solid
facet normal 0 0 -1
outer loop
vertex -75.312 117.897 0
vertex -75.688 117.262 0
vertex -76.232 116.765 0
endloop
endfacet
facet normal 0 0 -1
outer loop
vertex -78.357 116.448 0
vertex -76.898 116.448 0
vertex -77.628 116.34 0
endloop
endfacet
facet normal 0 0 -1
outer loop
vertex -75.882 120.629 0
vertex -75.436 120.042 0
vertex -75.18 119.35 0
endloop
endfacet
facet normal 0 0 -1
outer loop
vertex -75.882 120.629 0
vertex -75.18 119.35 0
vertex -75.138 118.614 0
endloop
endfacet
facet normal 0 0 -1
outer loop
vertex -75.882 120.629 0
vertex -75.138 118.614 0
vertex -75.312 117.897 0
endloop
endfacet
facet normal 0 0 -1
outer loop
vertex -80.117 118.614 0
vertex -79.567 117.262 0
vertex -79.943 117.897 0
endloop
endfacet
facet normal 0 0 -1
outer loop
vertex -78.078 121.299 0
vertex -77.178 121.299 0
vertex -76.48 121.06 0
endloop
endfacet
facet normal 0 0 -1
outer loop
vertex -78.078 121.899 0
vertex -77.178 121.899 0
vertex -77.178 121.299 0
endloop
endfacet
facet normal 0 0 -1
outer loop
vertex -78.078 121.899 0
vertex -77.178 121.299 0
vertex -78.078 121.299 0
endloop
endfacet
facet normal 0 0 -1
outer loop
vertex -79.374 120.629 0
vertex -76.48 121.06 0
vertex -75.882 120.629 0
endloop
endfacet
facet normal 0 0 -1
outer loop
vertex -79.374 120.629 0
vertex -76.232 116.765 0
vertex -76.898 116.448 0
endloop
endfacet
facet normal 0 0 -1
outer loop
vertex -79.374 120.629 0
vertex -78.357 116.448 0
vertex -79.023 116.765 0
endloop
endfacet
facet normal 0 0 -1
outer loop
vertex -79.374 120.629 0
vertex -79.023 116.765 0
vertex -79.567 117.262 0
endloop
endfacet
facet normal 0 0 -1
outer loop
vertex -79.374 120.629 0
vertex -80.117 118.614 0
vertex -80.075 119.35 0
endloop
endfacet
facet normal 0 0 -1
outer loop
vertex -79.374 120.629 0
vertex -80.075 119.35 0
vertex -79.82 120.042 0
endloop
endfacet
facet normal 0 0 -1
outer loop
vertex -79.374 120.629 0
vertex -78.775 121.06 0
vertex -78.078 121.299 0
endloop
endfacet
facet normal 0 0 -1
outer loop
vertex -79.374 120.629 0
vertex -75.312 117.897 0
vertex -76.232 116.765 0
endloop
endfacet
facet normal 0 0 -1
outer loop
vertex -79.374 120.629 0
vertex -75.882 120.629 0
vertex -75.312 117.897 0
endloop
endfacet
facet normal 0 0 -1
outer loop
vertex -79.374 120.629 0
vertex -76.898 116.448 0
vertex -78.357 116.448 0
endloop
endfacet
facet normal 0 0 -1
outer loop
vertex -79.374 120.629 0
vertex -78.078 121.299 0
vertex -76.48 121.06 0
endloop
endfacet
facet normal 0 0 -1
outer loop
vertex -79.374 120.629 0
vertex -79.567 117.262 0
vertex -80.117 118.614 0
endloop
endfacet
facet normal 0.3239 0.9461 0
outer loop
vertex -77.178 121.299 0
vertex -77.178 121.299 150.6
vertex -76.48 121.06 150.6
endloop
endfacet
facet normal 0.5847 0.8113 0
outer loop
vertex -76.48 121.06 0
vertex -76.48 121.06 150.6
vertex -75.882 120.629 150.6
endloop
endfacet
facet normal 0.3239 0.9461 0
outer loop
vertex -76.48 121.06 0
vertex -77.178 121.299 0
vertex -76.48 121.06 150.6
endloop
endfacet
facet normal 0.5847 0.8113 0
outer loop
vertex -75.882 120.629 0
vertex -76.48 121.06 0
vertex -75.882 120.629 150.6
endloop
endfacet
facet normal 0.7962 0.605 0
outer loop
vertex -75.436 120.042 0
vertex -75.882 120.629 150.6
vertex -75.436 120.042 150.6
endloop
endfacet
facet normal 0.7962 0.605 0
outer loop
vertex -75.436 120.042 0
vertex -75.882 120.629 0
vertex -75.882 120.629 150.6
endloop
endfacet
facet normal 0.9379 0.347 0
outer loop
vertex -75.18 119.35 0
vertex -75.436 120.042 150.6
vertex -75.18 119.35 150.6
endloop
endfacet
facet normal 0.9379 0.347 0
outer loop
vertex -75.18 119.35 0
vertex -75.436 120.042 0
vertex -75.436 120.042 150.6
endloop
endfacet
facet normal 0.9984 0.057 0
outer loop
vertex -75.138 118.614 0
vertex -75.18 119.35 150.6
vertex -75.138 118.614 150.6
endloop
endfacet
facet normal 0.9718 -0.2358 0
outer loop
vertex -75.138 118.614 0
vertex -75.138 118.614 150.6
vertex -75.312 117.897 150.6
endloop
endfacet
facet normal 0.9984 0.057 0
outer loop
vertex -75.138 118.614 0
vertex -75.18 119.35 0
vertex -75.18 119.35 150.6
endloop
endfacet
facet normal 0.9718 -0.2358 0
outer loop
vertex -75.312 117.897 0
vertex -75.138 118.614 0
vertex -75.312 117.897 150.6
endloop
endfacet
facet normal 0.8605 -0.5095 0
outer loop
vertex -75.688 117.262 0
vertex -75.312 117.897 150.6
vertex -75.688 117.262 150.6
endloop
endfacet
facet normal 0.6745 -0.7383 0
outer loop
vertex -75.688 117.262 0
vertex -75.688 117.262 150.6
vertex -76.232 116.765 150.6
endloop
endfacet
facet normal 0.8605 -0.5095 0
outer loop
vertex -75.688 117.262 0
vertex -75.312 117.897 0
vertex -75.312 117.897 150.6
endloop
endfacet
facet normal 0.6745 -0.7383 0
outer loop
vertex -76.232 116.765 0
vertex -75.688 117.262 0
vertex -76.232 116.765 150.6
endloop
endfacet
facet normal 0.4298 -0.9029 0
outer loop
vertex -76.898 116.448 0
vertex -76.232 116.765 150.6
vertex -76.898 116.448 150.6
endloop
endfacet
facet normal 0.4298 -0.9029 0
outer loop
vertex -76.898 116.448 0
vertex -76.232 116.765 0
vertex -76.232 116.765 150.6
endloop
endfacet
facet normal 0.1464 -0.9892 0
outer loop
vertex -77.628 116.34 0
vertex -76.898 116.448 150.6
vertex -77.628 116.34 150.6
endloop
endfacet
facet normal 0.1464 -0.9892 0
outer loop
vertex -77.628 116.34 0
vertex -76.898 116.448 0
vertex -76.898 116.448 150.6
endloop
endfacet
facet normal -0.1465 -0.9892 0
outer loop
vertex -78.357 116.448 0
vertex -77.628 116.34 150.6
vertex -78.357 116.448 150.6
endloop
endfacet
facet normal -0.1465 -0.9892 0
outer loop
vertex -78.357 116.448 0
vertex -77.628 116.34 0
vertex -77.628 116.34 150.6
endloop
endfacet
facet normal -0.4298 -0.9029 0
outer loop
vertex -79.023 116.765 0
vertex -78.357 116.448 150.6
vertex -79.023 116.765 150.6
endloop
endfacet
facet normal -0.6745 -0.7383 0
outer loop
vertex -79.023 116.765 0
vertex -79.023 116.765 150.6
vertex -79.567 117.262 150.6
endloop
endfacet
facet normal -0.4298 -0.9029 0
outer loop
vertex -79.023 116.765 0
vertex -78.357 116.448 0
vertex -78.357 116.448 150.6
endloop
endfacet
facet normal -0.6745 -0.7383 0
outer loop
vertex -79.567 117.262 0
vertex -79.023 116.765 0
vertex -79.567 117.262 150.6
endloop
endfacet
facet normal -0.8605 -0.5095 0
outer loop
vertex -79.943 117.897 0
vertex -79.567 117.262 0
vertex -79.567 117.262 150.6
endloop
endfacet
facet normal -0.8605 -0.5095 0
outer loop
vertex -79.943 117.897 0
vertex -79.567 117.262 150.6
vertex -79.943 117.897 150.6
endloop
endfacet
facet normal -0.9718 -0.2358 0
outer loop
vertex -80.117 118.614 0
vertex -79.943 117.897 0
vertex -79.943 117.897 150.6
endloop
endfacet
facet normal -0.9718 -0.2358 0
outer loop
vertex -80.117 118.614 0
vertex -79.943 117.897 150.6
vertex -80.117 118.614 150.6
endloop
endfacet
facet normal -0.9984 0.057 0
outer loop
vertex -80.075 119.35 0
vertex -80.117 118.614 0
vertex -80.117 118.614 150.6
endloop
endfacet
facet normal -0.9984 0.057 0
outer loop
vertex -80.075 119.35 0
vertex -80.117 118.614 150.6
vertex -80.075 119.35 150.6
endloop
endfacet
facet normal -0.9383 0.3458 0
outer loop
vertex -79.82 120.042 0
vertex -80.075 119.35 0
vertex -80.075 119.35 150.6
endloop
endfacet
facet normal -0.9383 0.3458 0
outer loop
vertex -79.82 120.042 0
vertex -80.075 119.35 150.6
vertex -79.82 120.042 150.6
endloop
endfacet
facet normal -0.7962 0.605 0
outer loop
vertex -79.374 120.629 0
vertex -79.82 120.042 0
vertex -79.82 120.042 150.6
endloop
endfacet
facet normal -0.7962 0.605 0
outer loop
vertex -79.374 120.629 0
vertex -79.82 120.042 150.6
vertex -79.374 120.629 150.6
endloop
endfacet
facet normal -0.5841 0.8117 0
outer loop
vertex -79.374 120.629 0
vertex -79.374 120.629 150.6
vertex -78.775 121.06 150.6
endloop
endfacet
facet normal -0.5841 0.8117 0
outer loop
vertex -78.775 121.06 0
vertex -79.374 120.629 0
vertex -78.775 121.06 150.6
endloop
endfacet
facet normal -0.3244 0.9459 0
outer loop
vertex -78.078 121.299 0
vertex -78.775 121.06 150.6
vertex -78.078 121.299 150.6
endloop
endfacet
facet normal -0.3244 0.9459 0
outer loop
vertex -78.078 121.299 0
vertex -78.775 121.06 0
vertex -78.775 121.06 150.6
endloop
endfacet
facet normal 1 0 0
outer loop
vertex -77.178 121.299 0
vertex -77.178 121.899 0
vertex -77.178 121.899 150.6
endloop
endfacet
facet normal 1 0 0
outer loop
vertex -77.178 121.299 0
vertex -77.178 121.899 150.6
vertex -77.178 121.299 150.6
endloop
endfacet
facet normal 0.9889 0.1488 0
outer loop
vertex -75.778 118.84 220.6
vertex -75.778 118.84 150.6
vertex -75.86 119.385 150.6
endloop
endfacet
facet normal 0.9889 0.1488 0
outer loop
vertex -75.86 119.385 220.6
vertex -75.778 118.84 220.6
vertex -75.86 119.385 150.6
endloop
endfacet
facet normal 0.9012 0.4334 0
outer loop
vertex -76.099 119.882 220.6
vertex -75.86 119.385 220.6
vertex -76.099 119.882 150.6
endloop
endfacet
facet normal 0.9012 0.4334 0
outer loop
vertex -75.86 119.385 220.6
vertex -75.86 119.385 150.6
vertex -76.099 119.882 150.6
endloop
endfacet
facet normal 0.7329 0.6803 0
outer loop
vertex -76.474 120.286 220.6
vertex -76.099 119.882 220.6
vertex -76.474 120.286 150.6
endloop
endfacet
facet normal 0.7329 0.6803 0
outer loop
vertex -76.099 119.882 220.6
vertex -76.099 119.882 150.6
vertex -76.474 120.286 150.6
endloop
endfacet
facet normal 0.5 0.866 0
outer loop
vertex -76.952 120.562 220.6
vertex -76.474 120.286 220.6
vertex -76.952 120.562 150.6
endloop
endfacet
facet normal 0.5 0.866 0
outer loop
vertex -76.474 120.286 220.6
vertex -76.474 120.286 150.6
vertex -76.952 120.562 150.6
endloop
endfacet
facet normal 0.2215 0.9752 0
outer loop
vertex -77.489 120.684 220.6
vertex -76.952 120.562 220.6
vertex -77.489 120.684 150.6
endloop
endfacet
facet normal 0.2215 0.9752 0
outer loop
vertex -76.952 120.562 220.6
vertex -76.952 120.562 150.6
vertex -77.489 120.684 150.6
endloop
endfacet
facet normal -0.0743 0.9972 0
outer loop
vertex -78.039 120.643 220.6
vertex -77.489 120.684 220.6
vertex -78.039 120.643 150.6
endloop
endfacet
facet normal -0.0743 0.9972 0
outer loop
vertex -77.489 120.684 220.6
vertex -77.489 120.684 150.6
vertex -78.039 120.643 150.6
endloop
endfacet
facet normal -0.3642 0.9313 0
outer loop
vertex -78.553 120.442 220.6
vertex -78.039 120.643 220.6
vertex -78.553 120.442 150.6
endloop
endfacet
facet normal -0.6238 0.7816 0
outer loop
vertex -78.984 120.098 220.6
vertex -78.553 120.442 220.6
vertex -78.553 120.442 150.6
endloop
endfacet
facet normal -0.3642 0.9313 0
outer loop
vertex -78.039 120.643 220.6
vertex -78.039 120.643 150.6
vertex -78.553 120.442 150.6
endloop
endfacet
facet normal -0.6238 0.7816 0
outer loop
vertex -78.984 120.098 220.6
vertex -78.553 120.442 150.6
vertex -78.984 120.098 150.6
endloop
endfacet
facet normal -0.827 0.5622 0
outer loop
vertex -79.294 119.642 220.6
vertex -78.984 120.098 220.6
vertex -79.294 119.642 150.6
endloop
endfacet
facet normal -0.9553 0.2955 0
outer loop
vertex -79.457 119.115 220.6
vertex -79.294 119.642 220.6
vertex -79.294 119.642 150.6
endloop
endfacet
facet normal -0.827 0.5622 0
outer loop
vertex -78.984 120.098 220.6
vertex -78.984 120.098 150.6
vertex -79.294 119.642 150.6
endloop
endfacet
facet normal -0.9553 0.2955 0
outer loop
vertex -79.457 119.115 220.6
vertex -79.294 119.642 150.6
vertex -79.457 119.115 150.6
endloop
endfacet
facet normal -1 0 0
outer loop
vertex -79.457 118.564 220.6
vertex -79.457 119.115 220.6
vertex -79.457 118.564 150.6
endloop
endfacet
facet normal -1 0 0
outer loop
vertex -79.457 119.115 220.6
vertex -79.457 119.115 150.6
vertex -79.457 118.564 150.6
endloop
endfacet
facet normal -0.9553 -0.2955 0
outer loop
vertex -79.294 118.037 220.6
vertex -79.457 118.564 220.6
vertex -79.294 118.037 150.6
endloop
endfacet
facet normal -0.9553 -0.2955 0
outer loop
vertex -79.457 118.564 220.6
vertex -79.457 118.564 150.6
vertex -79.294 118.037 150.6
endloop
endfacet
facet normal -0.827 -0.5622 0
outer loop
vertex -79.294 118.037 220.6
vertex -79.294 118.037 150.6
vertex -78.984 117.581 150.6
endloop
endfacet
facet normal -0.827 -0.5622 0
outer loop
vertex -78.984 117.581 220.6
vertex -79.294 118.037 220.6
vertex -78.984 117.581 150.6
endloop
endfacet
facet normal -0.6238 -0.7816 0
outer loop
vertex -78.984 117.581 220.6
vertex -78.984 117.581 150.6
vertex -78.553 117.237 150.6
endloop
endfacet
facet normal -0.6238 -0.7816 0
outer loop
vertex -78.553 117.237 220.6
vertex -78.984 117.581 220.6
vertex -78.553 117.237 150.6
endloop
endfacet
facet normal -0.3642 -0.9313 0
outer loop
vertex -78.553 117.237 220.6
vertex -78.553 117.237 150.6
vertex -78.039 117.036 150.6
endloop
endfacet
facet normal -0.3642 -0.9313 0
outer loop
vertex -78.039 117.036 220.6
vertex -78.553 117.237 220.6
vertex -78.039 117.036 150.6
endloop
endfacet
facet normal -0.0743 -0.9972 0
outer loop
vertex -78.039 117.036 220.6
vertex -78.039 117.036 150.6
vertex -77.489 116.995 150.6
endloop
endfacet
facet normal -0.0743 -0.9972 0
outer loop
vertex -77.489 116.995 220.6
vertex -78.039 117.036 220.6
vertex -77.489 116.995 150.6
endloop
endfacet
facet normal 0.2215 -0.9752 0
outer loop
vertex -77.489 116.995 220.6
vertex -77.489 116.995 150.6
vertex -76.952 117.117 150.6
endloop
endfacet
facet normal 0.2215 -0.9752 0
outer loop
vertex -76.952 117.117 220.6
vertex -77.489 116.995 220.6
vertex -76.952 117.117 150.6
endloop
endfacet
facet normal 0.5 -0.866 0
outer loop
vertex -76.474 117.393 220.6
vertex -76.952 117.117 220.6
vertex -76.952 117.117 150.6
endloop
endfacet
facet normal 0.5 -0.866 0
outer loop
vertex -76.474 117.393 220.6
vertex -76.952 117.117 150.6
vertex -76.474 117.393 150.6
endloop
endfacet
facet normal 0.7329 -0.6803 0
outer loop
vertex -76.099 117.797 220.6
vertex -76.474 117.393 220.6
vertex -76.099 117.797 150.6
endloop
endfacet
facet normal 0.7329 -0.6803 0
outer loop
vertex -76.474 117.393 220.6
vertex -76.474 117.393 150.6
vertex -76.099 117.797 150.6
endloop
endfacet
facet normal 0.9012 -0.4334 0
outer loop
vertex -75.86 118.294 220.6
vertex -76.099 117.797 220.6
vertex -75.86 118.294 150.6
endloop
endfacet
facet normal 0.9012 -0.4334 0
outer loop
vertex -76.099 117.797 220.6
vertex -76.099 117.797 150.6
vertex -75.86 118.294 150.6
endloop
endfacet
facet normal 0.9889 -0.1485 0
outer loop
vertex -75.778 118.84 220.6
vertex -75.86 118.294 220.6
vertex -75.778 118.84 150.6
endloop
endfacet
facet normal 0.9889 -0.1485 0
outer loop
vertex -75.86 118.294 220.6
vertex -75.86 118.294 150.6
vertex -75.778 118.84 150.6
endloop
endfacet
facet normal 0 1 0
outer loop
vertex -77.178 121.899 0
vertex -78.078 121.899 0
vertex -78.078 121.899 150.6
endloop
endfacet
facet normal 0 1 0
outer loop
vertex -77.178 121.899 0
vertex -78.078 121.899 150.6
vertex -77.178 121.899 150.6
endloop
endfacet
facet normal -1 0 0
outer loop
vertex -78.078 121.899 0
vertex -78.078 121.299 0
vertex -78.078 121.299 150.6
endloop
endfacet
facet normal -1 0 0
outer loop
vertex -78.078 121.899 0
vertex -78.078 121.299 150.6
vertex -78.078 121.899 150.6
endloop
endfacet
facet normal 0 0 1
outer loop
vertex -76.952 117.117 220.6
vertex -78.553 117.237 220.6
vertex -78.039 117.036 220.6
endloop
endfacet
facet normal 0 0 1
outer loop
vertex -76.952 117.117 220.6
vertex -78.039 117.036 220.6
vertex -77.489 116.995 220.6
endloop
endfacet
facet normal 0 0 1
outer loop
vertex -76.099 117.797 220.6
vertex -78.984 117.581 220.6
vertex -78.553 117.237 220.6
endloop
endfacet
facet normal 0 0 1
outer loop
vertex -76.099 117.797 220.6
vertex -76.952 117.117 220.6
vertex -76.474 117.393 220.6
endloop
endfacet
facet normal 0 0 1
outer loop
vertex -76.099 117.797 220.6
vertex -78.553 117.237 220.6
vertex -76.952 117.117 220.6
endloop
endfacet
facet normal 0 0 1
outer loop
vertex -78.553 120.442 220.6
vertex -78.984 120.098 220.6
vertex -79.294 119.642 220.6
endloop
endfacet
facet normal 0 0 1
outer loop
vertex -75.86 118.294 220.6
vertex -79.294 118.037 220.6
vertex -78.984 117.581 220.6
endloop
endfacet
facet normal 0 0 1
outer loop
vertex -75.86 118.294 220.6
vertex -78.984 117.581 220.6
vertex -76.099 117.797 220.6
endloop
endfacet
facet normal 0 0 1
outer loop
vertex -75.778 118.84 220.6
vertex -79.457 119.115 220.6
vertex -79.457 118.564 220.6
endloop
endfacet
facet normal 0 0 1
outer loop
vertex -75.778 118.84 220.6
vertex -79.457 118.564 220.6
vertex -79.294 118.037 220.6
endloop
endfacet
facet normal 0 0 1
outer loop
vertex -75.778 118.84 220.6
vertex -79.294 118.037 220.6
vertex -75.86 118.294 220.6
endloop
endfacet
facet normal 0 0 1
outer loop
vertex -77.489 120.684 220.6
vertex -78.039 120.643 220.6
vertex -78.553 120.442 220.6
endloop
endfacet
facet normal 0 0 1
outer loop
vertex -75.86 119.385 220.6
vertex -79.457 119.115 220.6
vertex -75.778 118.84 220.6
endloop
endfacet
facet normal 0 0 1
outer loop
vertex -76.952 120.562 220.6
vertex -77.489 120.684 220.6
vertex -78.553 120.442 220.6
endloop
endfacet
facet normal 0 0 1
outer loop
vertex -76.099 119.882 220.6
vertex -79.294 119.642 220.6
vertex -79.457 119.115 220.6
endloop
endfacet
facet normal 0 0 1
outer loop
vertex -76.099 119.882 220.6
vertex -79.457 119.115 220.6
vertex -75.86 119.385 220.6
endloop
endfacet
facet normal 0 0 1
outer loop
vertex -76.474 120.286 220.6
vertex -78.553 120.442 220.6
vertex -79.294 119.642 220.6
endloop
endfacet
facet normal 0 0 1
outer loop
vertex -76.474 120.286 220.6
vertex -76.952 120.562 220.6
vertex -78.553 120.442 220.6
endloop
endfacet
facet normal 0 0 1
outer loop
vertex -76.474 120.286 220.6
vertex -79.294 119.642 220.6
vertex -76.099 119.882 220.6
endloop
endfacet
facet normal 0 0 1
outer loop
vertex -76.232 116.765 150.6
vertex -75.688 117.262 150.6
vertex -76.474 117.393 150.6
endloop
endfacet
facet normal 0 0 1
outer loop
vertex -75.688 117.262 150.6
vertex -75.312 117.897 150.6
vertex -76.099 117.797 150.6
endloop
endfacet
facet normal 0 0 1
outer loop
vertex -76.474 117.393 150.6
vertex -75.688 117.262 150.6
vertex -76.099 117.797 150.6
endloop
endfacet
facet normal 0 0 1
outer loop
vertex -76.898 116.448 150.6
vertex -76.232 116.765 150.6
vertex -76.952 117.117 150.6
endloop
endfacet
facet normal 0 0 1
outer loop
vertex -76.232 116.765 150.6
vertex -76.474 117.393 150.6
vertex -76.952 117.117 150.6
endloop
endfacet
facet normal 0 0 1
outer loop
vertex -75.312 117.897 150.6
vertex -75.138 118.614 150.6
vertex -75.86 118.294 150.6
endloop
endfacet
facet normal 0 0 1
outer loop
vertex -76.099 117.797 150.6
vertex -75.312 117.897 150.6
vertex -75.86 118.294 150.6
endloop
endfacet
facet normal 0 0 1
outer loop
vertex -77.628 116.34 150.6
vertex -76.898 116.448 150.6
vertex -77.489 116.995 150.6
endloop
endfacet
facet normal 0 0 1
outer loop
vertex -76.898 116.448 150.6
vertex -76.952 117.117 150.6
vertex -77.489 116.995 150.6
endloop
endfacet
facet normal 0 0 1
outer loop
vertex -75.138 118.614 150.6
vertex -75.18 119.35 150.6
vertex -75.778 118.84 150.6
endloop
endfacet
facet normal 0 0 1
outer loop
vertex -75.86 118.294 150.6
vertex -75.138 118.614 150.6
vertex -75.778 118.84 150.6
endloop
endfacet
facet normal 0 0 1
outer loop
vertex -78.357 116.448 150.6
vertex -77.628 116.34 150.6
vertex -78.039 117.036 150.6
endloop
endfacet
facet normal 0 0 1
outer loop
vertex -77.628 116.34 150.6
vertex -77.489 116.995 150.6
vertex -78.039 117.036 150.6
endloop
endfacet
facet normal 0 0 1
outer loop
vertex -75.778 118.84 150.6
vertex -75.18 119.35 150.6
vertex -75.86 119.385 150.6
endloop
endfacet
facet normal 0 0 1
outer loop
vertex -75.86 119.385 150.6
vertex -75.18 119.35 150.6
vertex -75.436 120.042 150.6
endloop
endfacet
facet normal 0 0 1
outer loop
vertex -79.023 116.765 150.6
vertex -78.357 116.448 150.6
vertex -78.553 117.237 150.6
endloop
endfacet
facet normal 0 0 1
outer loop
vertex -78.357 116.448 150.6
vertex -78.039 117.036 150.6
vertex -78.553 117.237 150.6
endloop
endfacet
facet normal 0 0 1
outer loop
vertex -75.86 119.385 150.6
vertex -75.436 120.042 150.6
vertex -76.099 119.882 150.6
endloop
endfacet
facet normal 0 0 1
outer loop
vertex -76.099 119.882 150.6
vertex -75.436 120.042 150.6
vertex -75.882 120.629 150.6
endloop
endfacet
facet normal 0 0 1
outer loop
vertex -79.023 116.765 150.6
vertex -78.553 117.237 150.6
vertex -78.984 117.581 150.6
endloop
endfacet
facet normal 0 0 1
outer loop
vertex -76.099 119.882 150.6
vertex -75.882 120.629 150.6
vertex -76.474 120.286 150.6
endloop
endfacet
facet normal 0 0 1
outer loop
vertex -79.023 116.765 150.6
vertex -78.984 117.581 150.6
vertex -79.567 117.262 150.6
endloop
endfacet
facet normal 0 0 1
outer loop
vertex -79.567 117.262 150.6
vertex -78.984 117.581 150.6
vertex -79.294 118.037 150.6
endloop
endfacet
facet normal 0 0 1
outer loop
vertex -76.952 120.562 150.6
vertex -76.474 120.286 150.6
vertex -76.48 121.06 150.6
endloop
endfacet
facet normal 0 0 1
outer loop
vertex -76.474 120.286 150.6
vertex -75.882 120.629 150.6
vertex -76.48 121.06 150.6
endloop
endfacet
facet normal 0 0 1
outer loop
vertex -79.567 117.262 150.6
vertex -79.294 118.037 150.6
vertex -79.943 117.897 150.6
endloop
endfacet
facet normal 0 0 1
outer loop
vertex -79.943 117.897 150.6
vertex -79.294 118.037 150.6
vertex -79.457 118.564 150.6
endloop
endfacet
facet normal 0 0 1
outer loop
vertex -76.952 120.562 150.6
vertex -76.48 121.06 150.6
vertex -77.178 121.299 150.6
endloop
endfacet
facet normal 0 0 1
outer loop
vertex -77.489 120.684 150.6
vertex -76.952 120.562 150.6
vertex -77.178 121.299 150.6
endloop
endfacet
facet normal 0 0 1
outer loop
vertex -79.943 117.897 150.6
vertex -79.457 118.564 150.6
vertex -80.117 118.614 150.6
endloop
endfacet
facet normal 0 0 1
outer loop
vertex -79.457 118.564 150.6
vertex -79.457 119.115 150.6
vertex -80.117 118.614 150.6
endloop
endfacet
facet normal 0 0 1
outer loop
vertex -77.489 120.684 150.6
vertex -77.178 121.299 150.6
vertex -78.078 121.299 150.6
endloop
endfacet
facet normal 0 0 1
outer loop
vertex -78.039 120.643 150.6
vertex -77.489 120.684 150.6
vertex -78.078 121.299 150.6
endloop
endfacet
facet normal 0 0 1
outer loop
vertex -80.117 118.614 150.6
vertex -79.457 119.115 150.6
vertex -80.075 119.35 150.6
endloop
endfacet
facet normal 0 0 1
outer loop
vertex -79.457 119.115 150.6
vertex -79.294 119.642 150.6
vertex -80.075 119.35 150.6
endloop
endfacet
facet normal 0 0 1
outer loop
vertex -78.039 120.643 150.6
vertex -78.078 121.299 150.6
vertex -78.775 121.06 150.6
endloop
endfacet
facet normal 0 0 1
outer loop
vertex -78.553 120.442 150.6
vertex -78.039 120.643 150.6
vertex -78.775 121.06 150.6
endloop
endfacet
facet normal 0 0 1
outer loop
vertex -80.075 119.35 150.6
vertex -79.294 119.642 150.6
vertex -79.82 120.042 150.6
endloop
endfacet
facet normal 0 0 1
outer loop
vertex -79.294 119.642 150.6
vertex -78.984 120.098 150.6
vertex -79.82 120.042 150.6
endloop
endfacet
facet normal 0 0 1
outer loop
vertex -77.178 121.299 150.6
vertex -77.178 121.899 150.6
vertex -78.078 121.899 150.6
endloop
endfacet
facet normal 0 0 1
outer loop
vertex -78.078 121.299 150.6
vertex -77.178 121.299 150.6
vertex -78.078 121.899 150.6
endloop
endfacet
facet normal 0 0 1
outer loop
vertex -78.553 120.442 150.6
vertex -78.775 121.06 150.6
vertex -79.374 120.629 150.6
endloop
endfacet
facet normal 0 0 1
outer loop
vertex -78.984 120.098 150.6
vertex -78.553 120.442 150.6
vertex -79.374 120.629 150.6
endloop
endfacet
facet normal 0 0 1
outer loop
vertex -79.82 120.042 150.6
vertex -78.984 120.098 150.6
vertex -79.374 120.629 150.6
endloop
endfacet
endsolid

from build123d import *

# Parameters (mm, degrees)
SALIENTE_EXTRUIR1_DEPTH = 150.6
CROQUIS2_R              = 1.85
SALIENTE_EXTRUIR2_DEPTH = 70


with BuildPart() as part:
    # Croquis1 → Saliente-Extruir1 (new body)
    with BuildSketch(Plane.XY):
        with BuildLine():
            Line((-78.077598734, 121.298692457), (-78.077598734, 121.898692457))
            Line((-78.077598734, 121.898692457), (-77.177598734, 121.898692457))
            Line((-77.177598734, 121.898692457), (-77.177598734, 121.298692457))
            ThreePointArc((-77.177598734, 121.298692457), (-77.627598734, 116.339525931), (-78.077598734, 121.298692457))
        make_face()
    extrude(amount=SALIENTE_EXTRUIR1_DEPTH)

    # Croquis2 → Saliente-Extruir2 (add)
    with BuildSketch(Plane.XY.offset(150.6)):
        with Locations((-77.627598734, 118.839525931)):
            Circle(CROQUIS2_R)
    extrude(amount=SALIENTE_EXTRUIR2_DEPTH)


solid = part.part
